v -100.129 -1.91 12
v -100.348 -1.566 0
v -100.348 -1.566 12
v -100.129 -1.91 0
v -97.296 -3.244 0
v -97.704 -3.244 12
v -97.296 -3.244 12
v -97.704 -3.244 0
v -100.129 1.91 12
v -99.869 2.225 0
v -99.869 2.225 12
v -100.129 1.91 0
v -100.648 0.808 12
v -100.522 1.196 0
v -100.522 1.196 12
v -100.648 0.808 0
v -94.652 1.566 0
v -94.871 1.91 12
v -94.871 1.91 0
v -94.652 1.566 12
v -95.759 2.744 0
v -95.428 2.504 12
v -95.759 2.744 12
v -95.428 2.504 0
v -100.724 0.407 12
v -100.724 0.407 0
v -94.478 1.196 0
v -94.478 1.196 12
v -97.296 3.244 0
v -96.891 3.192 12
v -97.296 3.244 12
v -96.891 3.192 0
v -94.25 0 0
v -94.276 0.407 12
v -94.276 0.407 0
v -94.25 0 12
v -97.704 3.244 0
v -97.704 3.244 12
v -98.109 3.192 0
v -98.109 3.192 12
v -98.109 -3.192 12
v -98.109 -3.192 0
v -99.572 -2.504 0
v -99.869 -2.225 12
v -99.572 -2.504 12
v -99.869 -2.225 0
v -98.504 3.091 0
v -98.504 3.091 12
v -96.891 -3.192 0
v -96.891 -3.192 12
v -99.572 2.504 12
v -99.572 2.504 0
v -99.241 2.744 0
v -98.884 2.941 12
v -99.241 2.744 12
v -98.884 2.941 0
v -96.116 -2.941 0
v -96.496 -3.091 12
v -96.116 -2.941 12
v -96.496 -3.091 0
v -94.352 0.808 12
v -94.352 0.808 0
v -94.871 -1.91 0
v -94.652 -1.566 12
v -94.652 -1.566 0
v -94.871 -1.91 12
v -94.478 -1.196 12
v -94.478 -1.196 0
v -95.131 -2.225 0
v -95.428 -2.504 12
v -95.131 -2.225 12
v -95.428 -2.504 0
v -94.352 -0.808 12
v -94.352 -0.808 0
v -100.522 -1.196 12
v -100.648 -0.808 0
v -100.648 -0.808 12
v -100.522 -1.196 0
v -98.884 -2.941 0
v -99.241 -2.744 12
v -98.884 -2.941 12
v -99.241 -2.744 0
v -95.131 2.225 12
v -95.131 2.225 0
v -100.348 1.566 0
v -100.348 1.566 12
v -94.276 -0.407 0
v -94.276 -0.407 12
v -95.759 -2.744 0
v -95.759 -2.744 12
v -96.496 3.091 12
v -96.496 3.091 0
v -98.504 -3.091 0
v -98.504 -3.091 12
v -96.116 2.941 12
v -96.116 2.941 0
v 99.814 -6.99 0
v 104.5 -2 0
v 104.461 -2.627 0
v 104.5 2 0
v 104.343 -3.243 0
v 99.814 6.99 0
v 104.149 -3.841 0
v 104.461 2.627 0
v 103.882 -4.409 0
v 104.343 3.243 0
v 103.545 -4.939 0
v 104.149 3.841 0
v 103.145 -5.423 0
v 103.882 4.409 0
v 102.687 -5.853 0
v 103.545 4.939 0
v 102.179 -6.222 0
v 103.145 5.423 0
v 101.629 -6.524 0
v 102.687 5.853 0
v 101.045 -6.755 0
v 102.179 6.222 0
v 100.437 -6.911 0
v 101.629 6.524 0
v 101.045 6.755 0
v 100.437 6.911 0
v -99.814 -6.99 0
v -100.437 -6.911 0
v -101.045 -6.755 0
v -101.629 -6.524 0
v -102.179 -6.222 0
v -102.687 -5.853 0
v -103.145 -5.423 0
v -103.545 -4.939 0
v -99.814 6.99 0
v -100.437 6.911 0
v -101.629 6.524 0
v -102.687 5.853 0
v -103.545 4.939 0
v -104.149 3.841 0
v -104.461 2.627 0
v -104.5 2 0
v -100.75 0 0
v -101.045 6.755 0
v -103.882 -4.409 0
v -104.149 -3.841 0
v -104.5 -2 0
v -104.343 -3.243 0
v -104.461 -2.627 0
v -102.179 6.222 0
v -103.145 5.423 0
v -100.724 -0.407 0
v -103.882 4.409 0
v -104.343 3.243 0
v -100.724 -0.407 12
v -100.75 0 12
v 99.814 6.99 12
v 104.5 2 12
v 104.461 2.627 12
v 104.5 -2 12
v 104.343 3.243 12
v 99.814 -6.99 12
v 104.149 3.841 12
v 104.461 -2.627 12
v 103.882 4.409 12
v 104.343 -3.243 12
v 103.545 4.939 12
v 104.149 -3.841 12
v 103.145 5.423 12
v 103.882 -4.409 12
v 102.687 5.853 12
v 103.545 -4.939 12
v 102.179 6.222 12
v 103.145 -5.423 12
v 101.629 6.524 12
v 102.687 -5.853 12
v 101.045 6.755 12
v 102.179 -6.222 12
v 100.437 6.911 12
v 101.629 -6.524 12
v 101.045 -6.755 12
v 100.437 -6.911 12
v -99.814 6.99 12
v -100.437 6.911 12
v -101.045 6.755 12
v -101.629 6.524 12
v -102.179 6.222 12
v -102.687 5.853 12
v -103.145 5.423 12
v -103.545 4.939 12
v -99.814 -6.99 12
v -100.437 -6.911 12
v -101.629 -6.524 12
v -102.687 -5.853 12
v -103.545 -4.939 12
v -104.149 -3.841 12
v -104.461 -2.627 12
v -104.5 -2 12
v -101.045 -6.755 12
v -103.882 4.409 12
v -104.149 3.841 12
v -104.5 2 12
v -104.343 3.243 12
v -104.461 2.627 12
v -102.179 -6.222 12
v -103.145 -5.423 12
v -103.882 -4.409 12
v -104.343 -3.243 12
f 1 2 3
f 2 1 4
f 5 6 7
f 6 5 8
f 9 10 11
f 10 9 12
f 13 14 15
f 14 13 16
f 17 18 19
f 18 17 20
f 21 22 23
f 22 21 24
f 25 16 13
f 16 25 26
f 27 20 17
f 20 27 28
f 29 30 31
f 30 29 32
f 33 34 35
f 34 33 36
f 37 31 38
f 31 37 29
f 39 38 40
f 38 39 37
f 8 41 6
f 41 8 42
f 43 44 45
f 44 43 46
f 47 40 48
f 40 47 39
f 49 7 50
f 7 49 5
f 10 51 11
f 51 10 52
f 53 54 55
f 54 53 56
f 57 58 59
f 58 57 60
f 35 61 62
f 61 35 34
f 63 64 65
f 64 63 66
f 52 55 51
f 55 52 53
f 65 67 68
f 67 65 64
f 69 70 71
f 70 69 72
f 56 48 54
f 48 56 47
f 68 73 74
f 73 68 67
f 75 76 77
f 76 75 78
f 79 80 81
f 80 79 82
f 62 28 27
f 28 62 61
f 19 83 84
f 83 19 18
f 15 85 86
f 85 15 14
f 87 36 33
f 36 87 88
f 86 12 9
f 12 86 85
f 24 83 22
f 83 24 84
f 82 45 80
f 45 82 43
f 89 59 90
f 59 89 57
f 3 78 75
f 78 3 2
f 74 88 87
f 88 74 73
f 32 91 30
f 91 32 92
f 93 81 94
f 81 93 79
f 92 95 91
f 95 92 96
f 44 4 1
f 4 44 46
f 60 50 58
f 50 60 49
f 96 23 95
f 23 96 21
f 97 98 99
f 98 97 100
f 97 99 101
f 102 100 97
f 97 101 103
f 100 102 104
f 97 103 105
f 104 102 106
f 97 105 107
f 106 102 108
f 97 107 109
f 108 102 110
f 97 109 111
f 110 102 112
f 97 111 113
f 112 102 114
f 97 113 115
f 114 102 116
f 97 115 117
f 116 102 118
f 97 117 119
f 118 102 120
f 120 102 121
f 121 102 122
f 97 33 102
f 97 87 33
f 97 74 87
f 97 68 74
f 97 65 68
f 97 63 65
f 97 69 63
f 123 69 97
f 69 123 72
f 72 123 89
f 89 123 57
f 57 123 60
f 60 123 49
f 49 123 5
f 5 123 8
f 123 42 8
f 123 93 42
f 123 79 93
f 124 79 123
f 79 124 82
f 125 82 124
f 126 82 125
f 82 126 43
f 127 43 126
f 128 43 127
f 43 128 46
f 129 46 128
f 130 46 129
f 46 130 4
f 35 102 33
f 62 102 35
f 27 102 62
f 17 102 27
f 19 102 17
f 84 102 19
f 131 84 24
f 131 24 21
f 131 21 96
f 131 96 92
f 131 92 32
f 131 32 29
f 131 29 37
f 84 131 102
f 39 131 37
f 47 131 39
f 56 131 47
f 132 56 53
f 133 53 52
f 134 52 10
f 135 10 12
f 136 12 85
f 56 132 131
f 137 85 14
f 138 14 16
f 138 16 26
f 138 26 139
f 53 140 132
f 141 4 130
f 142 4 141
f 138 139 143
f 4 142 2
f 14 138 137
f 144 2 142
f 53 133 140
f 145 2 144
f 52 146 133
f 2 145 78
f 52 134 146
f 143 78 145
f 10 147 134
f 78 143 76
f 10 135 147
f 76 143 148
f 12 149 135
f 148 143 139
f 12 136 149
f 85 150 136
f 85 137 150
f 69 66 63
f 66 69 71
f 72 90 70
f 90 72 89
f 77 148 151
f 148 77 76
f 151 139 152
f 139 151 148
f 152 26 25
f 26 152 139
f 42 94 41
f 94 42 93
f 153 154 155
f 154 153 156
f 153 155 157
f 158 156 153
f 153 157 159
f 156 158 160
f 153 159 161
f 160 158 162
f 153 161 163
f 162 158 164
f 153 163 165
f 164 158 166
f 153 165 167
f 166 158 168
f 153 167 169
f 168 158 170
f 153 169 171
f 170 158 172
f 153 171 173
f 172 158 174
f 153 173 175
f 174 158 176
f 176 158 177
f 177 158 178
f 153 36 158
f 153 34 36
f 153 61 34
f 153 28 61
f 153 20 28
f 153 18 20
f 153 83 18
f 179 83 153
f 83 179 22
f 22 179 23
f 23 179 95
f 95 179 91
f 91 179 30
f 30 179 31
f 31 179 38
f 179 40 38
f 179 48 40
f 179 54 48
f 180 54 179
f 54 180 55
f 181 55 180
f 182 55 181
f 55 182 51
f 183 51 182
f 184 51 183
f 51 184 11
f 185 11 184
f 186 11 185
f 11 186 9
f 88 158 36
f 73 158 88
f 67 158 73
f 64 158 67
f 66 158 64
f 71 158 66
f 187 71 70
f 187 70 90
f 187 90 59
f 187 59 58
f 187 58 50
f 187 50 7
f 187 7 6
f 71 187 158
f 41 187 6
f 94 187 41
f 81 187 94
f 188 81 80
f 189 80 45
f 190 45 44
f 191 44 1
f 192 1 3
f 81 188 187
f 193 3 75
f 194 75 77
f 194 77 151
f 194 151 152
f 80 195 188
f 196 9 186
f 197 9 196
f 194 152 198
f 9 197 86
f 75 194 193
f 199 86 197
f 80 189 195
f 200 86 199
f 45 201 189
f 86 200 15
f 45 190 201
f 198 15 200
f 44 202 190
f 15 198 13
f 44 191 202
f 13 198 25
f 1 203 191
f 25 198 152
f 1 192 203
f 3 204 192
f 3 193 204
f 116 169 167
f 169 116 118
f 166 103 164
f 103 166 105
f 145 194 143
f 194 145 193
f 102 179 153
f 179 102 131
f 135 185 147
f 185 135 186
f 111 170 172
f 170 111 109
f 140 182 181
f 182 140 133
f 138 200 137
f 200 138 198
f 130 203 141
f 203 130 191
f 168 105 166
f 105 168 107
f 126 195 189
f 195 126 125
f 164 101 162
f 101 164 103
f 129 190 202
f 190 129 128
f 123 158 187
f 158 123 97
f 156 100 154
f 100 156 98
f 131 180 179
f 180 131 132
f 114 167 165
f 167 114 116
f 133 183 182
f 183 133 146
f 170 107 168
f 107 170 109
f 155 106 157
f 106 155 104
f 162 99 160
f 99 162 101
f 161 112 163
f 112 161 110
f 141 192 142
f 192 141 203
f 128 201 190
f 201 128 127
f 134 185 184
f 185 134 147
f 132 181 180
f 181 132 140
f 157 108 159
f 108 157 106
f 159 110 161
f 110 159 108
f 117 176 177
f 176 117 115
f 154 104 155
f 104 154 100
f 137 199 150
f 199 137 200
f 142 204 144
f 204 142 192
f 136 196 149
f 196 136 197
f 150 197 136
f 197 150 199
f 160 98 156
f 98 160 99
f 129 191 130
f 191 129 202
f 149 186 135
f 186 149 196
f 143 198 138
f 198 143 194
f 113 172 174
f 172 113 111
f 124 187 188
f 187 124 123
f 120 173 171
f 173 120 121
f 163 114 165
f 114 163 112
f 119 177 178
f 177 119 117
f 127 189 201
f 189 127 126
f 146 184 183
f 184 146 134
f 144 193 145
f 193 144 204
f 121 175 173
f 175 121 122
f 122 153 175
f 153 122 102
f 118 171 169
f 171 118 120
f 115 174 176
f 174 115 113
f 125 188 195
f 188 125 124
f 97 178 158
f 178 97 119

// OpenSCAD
$fn = 50;


difference() {
	union() {
		hull() {
			translate(v = [-99.5000000000, 2.0000000000, 0]) {
				cylinder(h = 12, r = 5);
			}
			translate(v = [99.5000000000, 2.0000000000, 0]) {
				cylinder(h = 12, r = 5);
			}
			translate(v = [-99.5000000000, -2.0000000000, 0]) {
				cylinder(h = 12, r = 5);
			}
			translate(v = [99.5000000000, -2.0000000000, 0]) {
				cylinder(h = 12, r = 5);
			}
		}
	}
	union() {
		translate(v = [-97.5000000000, 0.0000000000, 0]) {
			cylinder(h = 12, r = 3.2500000000);
		}
		translate(v = [-97.5000000000, 0.0000000000, 0]) {
			cylinder(h = 12, r = 1.8000000000);
		}
		translate(v = [-97.5000000000, 0.0000000000, 0]) {
			cylinder(h = 12, r = 1.8000000000);
		}
		translate(v = [-97.5000000000, 0.0000000000, 0]) {
			cylinder(h = 12, r = 1.8000000000);
		}
	}
}
